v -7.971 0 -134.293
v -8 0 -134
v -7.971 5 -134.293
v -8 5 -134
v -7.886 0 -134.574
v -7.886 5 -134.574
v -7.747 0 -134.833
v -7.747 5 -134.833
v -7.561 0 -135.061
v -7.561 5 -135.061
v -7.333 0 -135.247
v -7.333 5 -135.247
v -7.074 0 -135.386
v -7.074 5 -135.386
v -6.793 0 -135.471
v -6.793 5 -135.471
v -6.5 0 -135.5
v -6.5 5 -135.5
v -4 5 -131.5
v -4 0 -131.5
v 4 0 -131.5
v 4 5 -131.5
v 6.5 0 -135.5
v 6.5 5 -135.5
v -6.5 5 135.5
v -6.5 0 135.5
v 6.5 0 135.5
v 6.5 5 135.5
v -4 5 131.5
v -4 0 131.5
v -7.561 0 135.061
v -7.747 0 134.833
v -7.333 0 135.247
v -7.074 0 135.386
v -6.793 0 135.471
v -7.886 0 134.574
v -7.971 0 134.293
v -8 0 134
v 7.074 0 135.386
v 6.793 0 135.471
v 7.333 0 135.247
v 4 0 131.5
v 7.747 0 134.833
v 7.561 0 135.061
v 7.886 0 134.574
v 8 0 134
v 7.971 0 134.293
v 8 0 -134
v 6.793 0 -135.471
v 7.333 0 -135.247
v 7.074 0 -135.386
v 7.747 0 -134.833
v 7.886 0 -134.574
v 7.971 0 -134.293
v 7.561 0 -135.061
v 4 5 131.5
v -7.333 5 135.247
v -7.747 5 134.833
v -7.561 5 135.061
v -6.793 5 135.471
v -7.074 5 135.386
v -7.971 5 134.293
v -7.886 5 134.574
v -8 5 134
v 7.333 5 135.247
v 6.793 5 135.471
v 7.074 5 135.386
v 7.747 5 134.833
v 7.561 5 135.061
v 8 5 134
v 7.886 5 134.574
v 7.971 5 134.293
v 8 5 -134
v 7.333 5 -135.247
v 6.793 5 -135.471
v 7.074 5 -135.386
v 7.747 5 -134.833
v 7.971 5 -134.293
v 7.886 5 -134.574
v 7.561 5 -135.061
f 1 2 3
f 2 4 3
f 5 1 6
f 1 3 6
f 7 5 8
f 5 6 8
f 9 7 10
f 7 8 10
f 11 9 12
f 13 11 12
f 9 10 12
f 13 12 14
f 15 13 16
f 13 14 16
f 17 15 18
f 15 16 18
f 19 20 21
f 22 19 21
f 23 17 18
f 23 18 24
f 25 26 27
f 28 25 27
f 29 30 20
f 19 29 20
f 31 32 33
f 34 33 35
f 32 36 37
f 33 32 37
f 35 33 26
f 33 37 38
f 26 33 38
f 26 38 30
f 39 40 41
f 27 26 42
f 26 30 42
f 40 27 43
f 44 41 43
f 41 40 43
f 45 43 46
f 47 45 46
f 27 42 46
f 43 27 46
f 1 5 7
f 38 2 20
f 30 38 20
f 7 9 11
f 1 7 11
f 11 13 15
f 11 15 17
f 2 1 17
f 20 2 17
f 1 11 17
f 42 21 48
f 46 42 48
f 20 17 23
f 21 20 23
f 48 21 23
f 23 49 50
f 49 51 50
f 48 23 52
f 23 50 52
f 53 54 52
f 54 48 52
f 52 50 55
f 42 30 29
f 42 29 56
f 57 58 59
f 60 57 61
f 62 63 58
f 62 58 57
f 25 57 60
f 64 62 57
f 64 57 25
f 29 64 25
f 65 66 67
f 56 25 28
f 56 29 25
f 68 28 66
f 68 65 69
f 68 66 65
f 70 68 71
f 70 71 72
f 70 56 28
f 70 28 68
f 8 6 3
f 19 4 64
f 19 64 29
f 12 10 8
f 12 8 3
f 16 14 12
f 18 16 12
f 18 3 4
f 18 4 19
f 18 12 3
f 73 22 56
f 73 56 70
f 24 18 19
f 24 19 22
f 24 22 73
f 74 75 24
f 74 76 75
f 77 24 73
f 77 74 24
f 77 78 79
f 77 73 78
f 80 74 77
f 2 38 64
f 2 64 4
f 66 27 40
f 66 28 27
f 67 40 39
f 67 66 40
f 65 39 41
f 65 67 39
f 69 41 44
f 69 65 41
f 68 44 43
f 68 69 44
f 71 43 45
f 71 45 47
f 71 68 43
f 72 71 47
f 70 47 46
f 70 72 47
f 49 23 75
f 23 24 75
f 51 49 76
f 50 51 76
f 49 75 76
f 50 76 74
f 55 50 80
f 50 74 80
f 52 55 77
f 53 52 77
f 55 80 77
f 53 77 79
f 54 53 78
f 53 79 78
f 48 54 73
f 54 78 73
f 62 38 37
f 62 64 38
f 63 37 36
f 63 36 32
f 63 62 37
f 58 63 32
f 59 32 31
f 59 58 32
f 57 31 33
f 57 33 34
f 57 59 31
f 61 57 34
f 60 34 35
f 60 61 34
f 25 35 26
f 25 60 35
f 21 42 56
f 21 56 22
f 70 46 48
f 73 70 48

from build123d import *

# Parameters (mm, degrees)
SKETCH1_W           = 16
SKETCH1_H           = 271
SKETCH1_W_2         = 8
SKETCH1_H_2         = 263
BOSS_EXTRUDE1_DEPTH = 5
FILLET1_R           = 1.5


with BuildPart() as part:
    # Sketch1 → Boss-Extrude1 (new body)
    with BuildSketch(Plane(origin=(0, 0, 0), x_dir=(1, 0, 0), z_dir=(0, 1, 0))):
        Rectangle(SKETCH1_W, SKETCH1_H)
        Rectangle(SKETCH1_W_2, SKETCH1_H_2, mode=Mode.SUBTRACT)
    extrude(amount=BOSS_EXTRUDE1_DEPTH)

    # Fillet1
    fillet1_edges = [part.edges().sort_by_distance(p)[0] for p in [
        (8, 2.5, 135.5),
        (-8, 2.5, 135.5),
        (-8, 2.5, -135.5),
        (8, 2.5, -135.5),
    ]]
    fillet(fillet1_edges, radius=FILLET1_R)


solid = part.part
